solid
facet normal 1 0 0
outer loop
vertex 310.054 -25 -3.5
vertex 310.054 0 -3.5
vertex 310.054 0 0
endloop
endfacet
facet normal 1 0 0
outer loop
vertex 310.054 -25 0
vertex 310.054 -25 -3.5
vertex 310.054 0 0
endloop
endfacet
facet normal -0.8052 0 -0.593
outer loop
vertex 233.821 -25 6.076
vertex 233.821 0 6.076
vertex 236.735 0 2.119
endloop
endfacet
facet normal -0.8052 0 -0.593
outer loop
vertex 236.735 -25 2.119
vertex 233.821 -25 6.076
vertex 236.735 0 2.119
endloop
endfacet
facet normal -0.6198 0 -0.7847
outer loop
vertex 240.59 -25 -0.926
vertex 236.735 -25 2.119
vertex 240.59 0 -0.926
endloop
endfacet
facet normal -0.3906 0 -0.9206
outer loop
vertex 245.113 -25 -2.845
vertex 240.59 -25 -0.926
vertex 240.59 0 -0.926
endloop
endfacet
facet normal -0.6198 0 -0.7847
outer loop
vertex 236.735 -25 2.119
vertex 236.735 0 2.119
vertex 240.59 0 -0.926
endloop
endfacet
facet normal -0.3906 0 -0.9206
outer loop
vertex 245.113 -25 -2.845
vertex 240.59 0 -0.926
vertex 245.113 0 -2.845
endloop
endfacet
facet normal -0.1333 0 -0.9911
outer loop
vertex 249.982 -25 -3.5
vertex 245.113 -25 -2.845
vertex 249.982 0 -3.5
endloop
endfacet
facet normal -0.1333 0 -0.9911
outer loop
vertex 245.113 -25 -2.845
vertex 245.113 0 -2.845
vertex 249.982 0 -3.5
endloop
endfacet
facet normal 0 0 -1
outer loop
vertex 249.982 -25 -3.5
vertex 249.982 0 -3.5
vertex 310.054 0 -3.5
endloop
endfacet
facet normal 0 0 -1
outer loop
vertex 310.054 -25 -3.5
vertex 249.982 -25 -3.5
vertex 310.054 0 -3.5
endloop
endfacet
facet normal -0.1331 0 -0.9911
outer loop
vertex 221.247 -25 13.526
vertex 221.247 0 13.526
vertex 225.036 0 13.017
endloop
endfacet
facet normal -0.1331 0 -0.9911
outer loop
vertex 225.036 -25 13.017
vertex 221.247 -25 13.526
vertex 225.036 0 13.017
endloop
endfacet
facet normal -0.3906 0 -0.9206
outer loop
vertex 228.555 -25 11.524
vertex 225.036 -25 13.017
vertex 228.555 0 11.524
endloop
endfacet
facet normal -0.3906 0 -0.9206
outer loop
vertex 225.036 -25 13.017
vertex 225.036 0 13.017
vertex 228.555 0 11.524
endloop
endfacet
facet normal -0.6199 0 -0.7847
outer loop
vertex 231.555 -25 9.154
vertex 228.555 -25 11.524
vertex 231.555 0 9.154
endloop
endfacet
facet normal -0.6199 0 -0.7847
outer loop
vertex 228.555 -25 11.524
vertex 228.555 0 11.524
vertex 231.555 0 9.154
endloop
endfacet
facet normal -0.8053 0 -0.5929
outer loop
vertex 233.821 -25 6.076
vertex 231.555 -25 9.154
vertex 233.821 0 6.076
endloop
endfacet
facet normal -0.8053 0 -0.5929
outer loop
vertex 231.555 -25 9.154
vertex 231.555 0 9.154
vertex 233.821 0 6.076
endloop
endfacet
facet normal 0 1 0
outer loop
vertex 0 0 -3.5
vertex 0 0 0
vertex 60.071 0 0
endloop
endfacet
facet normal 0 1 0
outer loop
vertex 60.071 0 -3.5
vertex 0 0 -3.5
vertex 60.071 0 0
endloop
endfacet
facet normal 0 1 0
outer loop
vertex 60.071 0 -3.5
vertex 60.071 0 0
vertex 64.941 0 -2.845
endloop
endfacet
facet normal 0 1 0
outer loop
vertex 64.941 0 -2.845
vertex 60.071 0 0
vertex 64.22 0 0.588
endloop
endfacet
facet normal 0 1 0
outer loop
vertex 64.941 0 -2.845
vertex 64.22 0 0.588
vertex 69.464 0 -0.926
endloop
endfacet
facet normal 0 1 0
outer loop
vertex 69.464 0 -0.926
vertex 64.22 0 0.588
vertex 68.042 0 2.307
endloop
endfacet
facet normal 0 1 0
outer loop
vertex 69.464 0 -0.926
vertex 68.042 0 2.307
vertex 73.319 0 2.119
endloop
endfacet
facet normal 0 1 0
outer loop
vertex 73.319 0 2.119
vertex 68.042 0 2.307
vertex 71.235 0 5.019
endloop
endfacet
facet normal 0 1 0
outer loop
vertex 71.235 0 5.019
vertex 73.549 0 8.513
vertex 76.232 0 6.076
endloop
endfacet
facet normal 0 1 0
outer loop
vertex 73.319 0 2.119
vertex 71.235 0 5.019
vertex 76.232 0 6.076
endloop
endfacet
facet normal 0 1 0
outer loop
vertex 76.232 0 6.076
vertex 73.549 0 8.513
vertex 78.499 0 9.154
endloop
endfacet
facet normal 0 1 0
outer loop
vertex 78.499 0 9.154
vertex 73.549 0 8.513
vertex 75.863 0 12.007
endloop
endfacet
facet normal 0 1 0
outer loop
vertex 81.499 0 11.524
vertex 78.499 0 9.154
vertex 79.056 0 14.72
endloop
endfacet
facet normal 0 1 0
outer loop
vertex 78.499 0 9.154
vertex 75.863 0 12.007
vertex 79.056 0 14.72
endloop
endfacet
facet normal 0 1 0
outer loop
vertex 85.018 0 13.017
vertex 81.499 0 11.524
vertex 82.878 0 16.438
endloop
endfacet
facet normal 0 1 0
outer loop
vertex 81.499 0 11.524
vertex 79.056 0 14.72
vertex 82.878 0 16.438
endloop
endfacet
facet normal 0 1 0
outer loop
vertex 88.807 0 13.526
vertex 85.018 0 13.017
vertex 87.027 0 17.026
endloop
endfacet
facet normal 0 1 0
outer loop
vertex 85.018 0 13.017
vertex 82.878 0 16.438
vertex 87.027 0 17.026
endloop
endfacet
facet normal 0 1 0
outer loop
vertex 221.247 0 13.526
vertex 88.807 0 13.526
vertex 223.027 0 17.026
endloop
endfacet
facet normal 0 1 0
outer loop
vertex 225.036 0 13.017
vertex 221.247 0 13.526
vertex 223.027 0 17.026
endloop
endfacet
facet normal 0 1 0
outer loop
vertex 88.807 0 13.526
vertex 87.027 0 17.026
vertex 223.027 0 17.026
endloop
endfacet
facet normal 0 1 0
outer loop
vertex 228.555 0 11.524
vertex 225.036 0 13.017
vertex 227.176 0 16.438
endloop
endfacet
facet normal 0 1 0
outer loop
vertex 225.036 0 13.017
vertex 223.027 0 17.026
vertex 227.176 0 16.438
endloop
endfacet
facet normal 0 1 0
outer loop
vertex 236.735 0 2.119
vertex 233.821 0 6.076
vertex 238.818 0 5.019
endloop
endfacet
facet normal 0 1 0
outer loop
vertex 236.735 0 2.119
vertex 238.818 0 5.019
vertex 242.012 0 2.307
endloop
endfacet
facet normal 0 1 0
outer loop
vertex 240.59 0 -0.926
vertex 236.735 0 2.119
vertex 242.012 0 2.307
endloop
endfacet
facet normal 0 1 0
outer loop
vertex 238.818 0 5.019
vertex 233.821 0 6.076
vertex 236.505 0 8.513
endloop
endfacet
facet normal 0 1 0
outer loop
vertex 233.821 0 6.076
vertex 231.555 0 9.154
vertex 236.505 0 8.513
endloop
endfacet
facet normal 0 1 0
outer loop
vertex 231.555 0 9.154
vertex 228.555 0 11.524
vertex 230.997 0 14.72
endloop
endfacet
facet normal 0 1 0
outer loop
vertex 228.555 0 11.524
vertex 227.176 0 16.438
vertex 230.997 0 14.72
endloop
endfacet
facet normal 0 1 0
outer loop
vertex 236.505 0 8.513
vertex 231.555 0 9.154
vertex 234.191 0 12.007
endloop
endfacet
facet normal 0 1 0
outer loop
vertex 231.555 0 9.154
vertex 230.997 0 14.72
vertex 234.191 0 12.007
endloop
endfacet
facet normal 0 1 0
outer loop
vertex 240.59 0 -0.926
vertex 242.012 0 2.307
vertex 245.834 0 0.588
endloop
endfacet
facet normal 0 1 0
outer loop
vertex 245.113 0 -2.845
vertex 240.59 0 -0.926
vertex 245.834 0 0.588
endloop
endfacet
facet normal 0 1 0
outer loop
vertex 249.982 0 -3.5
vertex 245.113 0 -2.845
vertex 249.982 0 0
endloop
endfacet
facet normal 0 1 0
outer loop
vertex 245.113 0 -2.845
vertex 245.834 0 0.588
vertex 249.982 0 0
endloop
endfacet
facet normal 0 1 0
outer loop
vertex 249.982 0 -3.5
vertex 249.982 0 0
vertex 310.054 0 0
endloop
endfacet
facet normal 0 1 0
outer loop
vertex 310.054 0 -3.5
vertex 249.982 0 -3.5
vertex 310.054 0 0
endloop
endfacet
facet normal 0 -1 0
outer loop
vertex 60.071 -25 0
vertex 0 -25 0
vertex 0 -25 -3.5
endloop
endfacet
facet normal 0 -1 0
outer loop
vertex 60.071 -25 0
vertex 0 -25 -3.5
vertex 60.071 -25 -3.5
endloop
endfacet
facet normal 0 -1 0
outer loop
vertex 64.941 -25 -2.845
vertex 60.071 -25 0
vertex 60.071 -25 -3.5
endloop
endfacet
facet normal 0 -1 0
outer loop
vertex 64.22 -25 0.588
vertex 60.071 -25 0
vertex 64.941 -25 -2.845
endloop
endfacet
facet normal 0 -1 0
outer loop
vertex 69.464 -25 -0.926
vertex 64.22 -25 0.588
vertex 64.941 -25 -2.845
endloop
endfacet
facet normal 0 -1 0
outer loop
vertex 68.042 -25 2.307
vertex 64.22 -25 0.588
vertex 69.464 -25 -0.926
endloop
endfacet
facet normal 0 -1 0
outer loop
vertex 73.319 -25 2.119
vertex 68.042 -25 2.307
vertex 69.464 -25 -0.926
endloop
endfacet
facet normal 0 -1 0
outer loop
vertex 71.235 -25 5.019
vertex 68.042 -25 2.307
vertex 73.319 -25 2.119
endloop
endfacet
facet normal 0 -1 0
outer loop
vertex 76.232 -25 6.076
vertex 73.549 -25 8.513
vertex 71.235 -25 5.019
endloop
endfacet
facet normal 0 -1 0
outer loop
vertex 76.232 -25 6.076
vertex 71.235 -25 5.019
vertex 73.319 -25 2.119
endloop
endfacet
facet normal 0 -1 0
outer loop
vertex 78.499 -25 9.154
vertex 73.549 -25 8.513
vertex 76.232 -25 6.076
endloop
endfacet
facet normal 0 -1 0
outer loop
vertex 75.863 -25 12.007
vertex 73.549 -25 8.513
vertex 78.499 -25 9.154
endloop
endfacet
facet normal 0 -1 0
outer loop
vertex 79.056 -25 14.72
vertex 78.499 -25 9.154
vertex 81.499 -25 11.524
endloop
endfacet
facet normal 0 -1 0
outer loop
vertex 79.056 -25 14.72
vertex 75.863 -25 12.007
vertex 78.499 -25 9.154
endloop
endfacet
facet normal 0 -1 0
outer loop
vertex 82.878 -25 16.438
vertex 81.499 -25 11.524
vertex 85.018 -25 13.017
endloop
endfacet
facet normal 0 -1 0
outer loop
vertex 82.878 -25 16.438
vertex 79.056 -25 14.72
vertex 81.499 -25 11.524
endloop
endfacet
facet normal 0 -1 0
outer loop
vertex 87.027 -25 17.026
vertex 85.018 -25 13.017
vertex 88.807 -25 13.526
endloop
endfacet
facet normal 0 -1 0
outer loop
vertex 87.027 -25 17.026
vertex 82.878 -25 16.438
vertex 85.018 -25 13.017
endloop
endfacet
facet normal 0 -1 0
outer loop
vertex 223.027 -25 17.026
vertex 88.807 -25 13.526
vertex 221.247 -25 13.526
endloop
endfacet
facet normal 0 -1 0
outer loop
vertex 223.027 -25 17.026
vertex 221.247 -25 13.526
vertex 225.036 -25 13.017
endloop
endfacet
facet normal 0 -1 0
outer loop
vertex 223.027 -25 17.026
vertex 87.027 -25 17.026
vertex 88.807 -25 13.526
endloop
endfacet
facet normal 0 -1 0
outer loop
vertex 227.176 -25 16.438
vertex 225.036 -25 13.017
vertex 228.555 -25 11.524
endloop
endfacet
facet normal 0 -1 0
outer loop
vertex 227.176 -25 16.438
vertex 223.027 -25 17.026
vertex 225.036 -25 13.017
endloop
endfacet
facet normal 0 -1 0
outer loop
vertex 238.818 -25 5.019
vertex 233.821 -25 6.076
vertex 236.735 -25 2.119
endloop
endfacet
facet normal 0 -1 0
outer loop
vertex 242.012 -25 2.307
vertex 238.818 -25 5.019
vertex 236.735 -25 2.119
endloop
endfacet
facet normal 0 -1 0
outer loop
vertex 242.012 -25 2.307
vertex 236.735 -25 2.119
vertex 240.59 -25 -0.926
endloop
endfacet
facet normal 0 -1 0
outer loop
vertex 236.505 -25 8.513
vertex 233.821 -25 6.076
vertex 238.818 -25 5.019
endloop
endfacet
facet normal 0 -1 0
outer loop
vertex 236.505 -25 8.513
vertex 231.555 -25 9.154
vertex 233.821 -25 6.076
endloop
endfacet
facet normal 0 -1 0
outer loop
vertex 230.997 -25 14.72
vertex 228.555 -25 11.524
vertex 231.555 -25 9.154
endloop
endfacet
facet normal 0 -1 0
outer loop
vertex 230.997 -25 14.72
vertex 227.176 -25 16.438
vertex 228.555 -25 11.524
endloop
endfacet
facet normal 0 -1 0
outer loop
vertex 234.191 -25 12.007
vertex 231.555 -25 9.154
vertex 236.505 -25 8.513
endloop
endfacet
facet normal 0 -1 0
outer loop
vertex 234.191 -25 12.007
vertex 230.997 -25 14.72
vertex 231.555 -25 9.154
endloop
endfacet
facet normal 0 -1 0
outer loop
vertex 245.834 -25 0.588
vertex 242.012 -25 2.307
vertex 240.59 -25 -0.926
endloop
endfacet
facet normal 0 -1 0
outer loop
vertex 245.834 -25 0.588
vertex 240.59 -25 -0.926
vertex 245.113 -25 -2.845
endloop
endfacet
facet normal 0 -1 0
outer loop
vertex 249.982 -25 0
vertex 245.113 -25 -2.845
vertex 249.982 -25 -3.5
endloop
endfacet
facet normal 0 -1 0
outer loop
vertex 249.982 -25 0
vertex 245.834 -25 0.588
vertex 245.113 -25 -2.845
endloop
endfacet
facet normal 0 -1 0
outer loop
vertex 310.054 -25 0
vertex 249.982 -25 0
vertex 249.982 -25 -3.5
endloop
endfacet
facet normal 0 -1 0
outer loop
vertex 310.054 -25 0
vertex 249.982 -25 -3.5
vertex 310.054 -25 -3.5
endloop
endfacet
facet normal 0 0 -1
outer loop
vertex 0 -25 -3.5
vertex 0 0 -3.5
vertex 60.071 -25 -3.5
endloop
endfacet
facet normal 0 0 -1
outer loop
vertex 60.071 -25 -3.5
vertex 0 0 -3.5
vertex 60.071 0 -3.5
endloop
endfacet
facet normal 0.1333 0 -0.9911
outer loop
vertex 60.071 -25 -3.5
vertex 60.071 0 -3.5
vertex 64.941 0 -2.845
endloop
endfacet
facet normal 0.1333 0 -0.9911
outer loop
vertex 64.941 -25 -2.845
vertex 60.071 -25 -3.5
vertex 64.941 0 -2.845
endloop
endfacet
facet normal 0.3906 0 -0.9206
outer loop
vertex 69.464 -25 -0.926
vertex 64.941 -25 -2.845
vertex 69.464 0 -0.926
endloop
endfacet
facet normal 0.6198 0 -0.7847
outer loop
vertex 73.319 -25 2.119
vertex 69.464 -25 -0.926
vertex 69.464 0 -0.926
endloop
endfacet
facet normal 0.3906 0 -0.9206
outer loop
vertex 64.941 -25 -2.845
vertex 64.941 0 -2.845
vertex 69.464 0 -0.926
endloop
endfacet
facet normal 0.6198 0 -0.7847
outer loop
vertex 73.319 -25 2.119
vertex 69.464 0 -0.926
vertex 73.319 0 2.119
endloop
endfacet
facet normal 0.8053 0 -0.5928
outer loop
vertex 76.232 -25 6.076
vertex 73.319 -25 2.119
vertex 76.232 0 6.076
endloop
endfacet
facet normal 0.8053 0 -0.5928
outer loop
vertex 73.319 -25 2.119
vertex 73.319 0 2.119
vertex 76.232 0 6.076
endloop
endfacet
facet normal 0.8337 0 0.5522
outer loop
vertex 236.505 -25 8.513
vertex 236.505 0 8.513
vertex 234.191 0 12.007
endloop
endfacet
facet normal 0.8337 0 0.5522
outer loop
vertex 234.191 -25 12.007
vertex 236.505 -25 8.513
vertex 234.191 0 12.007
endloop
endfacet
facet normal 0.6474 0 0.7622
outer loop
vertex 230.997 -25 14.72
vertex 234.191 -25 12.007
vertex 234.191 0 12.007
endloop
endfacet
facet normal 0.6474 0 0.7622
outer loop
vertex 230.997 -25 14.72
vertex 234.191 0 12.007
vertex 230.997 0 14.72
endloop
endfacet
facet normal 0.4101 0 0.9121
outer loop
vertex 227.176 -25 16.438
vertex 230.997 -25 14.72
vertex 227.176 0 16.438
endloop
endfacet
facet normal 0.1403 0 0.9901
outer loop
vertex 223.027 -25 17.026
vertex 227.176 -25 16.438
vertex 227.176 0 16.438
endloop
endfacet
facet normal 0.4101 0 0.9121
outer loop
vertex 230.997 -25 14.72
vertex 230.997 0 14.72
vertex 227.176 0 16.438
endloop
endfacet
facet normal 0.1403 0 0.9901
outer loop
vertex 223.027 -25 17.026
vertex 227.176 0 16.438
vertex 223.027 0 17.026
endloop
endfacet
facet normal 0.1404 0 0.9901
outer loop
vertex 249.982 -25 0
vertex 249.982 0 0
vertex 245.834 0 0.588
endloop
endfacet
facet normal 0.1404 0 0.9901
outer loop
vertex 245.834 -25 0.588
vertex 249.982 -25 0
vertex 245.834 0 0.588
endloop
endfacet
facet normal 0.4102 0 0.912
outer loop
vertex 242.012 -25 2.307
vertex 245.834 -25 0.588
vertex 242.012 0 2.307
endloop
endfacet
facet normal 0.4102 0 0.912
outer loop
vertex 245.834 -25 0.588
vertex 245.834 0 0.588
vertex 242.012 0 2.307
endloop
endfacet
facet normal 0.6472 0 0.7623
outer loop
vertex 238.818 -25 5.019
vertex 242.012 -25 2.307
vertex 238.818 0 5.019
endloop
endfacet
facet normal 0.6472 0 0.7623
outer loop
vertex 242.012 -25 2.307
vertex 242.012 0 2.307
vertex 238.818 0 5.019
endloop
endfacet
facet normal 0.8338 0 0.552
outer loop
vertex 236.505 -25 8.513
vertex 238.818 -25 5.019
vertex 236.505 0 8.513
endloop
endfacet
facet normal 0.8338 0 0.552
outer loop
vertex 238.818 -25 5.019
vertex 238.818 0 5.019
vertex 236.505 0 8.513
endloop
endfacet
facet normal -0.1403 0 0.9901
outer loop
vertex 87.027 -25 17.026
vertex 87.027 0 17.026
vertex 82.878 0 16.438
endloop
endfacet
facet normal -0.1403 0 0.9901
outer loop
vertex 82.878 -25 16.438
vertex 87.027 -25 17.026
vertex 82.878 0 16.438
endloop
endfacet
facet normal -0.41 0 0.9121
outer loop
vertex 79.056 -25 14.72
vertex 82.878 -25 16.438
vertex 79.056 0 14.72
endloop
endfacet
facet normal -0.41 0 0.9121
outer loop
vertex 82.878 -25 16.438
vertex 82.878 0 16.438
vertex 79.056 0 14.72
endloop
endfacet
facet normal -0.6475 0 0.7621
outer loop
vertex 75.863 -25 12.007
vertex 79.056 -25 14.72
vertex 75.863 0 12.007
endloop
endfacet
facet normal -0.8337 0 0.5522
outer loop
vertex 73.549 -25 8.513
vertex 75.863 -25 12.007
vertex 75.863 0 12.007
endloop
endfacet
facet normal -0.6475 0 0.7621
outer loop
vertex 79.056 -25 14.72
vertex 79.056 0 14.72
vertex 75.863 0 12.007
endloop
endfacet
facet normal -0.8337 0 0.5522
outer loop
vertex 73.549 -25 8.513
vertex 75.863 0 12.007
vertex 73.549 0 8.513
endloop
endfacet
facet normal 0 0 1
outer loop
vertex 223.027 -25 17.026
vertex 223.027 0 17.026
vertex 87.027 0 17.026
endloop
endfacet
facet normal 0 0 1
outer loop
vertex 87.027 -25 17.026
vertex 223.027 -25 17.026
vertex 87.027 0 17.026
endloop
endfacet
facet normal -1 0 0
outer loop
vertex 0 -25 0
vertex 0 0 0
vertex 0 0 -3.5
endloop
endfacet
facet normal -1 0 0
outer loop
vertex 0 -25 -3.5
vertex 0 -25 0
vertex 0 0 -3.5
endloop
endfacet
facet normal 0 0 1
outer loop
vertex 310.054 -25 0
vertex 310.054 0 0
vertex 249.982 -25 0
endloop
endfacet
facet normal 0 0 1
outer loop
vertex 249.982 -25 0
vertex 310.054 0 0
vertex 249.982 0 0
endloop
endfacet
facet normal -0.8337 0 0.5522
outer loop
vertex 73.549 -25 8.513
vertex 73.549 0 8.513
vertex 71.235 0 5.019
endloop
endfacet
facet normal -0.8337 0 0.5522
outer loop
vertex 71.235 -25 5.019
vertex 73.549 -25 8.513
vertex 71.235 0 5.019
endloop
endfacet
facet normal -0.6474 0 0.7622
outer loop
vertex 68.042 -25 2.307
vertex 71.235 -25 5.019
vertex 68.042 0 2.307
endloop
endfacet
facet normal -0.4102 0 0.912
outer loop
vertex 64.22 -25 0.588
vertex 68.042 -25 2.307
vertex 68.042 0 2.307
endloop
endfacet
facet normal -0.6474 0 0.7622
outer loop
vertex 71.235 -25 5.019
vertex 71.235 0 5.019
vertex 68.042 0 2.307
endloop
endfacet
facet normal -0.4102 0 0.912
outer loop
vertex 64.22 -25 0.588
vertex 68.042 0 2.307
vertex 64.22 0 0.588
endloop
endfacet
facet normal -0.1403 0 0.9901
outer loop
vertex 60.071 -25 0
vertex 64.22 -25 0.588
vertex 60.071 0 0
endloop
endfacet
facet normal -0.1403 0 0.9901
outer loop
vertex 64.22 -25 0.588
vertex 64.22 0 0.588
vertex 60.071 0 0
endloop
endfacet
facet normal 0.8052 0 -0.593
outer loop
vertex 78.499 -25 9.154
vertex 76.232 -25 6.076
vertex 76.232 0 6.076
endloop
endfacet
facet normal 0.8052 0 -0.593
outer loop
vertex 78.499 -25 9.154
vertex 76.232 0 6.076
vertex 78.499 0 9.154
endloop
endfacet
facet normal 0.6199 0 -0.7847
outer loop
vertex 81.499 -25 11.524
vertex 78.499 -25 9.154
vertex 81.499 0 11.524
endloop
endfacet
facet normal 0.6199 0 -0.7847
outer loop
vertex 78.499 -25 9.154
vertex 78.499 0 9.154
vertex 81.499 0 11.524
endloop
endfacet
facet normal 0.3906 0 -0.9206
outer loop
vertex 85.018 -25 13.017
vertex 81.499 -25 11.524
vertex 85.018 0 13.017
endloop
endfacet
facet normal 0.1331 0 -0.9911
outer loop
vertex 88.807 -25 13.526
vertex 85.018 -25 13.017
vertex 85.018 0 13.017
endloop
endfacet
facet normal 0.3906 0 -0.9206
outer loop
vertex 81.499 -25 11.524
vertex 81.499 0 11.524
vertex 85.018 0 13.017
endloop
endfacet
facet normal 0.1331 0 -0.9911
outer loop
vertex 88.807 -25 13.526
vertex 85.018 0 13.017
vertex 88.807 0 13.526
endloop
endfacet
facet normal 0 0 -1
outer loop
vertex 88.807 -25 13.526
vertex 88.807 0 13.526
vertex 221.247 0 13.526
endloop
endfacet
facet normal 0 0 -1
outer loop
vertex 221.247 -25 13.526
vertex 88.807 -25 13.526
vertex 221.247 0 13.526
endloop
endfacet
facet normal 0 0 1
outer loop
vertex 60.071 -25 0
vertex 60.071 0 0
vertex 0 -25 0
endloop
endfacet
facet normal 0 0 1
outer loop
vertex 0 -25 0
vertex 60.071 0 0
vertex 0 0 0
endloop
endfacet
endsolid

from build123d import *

# Parameters (mm, degrees)
F1_DEPTH = 25


with BuildPart() as f1:
    # F0 (on Front) → F1 (new body)
    with BuildSketch(Plane.XZ):
        with BuildLine():
            Line((223.026821, 17.026341), (155.026801, 17.026341))
            Line((155.026801, 17.026341), (155.026801, 13.526341))
            Line((155.026801, 13.526341), (221.246859, 13.526341))
            ThreePointArc((221.246859, 13.526341), (228.554933, 11.523823), (233.821421, 6.07569))
            ThreePointArc((233.821421, 6.07569), (240.58999, -0.926332), (249.982439, -3.5))
            Line((249.982439, -3.5), (310.053602, -3.5))
            Line((310.053602, -3.5), (310.053602, 0))
            Line((310.053602, 0), (249.982439, 0))
            ThreePointArc((249.982439, 0), (242.011783, 2.306512), (236.50463, 8.513171))
            ThreePointArc((236.50463, 8.513171), (230.997477, 14.71983), (223.026821, 17.026341))
        make_face()
        with BuildLine():
            Line((60.071163, 0), (0, 0))
            Line((0, 0), (0, -3.5))
            Line((0, -3.5), (60.071163, -3.5))
            ThreePointArc((60.071163, -3.5), (69.463611, -0.926332), (76.232181, 6.07569))
            ThreePointArc((76.232181, 6.07569), (81.498668, 11.523823), (88.806743, 13.526341))
            Line((88.806743, 13.526341), (155.026801, 13.526341))
            Line((155.026801, 13.526341), (155.026801, 17.026341))
            Line((155.026801, 17.026341), (87.02678, 17.026341))
            ThreePointArc((87.02678, 17.026341), (79.056125, 14.71983), (73.548972, 8.513171))
            ThreePointArc((73.548972, 8.513171), (68.041819, 2.306512), (60.071163, 0))
        make_face()
    extrude(amount=F1_DEPTH)


solid = f1.part
